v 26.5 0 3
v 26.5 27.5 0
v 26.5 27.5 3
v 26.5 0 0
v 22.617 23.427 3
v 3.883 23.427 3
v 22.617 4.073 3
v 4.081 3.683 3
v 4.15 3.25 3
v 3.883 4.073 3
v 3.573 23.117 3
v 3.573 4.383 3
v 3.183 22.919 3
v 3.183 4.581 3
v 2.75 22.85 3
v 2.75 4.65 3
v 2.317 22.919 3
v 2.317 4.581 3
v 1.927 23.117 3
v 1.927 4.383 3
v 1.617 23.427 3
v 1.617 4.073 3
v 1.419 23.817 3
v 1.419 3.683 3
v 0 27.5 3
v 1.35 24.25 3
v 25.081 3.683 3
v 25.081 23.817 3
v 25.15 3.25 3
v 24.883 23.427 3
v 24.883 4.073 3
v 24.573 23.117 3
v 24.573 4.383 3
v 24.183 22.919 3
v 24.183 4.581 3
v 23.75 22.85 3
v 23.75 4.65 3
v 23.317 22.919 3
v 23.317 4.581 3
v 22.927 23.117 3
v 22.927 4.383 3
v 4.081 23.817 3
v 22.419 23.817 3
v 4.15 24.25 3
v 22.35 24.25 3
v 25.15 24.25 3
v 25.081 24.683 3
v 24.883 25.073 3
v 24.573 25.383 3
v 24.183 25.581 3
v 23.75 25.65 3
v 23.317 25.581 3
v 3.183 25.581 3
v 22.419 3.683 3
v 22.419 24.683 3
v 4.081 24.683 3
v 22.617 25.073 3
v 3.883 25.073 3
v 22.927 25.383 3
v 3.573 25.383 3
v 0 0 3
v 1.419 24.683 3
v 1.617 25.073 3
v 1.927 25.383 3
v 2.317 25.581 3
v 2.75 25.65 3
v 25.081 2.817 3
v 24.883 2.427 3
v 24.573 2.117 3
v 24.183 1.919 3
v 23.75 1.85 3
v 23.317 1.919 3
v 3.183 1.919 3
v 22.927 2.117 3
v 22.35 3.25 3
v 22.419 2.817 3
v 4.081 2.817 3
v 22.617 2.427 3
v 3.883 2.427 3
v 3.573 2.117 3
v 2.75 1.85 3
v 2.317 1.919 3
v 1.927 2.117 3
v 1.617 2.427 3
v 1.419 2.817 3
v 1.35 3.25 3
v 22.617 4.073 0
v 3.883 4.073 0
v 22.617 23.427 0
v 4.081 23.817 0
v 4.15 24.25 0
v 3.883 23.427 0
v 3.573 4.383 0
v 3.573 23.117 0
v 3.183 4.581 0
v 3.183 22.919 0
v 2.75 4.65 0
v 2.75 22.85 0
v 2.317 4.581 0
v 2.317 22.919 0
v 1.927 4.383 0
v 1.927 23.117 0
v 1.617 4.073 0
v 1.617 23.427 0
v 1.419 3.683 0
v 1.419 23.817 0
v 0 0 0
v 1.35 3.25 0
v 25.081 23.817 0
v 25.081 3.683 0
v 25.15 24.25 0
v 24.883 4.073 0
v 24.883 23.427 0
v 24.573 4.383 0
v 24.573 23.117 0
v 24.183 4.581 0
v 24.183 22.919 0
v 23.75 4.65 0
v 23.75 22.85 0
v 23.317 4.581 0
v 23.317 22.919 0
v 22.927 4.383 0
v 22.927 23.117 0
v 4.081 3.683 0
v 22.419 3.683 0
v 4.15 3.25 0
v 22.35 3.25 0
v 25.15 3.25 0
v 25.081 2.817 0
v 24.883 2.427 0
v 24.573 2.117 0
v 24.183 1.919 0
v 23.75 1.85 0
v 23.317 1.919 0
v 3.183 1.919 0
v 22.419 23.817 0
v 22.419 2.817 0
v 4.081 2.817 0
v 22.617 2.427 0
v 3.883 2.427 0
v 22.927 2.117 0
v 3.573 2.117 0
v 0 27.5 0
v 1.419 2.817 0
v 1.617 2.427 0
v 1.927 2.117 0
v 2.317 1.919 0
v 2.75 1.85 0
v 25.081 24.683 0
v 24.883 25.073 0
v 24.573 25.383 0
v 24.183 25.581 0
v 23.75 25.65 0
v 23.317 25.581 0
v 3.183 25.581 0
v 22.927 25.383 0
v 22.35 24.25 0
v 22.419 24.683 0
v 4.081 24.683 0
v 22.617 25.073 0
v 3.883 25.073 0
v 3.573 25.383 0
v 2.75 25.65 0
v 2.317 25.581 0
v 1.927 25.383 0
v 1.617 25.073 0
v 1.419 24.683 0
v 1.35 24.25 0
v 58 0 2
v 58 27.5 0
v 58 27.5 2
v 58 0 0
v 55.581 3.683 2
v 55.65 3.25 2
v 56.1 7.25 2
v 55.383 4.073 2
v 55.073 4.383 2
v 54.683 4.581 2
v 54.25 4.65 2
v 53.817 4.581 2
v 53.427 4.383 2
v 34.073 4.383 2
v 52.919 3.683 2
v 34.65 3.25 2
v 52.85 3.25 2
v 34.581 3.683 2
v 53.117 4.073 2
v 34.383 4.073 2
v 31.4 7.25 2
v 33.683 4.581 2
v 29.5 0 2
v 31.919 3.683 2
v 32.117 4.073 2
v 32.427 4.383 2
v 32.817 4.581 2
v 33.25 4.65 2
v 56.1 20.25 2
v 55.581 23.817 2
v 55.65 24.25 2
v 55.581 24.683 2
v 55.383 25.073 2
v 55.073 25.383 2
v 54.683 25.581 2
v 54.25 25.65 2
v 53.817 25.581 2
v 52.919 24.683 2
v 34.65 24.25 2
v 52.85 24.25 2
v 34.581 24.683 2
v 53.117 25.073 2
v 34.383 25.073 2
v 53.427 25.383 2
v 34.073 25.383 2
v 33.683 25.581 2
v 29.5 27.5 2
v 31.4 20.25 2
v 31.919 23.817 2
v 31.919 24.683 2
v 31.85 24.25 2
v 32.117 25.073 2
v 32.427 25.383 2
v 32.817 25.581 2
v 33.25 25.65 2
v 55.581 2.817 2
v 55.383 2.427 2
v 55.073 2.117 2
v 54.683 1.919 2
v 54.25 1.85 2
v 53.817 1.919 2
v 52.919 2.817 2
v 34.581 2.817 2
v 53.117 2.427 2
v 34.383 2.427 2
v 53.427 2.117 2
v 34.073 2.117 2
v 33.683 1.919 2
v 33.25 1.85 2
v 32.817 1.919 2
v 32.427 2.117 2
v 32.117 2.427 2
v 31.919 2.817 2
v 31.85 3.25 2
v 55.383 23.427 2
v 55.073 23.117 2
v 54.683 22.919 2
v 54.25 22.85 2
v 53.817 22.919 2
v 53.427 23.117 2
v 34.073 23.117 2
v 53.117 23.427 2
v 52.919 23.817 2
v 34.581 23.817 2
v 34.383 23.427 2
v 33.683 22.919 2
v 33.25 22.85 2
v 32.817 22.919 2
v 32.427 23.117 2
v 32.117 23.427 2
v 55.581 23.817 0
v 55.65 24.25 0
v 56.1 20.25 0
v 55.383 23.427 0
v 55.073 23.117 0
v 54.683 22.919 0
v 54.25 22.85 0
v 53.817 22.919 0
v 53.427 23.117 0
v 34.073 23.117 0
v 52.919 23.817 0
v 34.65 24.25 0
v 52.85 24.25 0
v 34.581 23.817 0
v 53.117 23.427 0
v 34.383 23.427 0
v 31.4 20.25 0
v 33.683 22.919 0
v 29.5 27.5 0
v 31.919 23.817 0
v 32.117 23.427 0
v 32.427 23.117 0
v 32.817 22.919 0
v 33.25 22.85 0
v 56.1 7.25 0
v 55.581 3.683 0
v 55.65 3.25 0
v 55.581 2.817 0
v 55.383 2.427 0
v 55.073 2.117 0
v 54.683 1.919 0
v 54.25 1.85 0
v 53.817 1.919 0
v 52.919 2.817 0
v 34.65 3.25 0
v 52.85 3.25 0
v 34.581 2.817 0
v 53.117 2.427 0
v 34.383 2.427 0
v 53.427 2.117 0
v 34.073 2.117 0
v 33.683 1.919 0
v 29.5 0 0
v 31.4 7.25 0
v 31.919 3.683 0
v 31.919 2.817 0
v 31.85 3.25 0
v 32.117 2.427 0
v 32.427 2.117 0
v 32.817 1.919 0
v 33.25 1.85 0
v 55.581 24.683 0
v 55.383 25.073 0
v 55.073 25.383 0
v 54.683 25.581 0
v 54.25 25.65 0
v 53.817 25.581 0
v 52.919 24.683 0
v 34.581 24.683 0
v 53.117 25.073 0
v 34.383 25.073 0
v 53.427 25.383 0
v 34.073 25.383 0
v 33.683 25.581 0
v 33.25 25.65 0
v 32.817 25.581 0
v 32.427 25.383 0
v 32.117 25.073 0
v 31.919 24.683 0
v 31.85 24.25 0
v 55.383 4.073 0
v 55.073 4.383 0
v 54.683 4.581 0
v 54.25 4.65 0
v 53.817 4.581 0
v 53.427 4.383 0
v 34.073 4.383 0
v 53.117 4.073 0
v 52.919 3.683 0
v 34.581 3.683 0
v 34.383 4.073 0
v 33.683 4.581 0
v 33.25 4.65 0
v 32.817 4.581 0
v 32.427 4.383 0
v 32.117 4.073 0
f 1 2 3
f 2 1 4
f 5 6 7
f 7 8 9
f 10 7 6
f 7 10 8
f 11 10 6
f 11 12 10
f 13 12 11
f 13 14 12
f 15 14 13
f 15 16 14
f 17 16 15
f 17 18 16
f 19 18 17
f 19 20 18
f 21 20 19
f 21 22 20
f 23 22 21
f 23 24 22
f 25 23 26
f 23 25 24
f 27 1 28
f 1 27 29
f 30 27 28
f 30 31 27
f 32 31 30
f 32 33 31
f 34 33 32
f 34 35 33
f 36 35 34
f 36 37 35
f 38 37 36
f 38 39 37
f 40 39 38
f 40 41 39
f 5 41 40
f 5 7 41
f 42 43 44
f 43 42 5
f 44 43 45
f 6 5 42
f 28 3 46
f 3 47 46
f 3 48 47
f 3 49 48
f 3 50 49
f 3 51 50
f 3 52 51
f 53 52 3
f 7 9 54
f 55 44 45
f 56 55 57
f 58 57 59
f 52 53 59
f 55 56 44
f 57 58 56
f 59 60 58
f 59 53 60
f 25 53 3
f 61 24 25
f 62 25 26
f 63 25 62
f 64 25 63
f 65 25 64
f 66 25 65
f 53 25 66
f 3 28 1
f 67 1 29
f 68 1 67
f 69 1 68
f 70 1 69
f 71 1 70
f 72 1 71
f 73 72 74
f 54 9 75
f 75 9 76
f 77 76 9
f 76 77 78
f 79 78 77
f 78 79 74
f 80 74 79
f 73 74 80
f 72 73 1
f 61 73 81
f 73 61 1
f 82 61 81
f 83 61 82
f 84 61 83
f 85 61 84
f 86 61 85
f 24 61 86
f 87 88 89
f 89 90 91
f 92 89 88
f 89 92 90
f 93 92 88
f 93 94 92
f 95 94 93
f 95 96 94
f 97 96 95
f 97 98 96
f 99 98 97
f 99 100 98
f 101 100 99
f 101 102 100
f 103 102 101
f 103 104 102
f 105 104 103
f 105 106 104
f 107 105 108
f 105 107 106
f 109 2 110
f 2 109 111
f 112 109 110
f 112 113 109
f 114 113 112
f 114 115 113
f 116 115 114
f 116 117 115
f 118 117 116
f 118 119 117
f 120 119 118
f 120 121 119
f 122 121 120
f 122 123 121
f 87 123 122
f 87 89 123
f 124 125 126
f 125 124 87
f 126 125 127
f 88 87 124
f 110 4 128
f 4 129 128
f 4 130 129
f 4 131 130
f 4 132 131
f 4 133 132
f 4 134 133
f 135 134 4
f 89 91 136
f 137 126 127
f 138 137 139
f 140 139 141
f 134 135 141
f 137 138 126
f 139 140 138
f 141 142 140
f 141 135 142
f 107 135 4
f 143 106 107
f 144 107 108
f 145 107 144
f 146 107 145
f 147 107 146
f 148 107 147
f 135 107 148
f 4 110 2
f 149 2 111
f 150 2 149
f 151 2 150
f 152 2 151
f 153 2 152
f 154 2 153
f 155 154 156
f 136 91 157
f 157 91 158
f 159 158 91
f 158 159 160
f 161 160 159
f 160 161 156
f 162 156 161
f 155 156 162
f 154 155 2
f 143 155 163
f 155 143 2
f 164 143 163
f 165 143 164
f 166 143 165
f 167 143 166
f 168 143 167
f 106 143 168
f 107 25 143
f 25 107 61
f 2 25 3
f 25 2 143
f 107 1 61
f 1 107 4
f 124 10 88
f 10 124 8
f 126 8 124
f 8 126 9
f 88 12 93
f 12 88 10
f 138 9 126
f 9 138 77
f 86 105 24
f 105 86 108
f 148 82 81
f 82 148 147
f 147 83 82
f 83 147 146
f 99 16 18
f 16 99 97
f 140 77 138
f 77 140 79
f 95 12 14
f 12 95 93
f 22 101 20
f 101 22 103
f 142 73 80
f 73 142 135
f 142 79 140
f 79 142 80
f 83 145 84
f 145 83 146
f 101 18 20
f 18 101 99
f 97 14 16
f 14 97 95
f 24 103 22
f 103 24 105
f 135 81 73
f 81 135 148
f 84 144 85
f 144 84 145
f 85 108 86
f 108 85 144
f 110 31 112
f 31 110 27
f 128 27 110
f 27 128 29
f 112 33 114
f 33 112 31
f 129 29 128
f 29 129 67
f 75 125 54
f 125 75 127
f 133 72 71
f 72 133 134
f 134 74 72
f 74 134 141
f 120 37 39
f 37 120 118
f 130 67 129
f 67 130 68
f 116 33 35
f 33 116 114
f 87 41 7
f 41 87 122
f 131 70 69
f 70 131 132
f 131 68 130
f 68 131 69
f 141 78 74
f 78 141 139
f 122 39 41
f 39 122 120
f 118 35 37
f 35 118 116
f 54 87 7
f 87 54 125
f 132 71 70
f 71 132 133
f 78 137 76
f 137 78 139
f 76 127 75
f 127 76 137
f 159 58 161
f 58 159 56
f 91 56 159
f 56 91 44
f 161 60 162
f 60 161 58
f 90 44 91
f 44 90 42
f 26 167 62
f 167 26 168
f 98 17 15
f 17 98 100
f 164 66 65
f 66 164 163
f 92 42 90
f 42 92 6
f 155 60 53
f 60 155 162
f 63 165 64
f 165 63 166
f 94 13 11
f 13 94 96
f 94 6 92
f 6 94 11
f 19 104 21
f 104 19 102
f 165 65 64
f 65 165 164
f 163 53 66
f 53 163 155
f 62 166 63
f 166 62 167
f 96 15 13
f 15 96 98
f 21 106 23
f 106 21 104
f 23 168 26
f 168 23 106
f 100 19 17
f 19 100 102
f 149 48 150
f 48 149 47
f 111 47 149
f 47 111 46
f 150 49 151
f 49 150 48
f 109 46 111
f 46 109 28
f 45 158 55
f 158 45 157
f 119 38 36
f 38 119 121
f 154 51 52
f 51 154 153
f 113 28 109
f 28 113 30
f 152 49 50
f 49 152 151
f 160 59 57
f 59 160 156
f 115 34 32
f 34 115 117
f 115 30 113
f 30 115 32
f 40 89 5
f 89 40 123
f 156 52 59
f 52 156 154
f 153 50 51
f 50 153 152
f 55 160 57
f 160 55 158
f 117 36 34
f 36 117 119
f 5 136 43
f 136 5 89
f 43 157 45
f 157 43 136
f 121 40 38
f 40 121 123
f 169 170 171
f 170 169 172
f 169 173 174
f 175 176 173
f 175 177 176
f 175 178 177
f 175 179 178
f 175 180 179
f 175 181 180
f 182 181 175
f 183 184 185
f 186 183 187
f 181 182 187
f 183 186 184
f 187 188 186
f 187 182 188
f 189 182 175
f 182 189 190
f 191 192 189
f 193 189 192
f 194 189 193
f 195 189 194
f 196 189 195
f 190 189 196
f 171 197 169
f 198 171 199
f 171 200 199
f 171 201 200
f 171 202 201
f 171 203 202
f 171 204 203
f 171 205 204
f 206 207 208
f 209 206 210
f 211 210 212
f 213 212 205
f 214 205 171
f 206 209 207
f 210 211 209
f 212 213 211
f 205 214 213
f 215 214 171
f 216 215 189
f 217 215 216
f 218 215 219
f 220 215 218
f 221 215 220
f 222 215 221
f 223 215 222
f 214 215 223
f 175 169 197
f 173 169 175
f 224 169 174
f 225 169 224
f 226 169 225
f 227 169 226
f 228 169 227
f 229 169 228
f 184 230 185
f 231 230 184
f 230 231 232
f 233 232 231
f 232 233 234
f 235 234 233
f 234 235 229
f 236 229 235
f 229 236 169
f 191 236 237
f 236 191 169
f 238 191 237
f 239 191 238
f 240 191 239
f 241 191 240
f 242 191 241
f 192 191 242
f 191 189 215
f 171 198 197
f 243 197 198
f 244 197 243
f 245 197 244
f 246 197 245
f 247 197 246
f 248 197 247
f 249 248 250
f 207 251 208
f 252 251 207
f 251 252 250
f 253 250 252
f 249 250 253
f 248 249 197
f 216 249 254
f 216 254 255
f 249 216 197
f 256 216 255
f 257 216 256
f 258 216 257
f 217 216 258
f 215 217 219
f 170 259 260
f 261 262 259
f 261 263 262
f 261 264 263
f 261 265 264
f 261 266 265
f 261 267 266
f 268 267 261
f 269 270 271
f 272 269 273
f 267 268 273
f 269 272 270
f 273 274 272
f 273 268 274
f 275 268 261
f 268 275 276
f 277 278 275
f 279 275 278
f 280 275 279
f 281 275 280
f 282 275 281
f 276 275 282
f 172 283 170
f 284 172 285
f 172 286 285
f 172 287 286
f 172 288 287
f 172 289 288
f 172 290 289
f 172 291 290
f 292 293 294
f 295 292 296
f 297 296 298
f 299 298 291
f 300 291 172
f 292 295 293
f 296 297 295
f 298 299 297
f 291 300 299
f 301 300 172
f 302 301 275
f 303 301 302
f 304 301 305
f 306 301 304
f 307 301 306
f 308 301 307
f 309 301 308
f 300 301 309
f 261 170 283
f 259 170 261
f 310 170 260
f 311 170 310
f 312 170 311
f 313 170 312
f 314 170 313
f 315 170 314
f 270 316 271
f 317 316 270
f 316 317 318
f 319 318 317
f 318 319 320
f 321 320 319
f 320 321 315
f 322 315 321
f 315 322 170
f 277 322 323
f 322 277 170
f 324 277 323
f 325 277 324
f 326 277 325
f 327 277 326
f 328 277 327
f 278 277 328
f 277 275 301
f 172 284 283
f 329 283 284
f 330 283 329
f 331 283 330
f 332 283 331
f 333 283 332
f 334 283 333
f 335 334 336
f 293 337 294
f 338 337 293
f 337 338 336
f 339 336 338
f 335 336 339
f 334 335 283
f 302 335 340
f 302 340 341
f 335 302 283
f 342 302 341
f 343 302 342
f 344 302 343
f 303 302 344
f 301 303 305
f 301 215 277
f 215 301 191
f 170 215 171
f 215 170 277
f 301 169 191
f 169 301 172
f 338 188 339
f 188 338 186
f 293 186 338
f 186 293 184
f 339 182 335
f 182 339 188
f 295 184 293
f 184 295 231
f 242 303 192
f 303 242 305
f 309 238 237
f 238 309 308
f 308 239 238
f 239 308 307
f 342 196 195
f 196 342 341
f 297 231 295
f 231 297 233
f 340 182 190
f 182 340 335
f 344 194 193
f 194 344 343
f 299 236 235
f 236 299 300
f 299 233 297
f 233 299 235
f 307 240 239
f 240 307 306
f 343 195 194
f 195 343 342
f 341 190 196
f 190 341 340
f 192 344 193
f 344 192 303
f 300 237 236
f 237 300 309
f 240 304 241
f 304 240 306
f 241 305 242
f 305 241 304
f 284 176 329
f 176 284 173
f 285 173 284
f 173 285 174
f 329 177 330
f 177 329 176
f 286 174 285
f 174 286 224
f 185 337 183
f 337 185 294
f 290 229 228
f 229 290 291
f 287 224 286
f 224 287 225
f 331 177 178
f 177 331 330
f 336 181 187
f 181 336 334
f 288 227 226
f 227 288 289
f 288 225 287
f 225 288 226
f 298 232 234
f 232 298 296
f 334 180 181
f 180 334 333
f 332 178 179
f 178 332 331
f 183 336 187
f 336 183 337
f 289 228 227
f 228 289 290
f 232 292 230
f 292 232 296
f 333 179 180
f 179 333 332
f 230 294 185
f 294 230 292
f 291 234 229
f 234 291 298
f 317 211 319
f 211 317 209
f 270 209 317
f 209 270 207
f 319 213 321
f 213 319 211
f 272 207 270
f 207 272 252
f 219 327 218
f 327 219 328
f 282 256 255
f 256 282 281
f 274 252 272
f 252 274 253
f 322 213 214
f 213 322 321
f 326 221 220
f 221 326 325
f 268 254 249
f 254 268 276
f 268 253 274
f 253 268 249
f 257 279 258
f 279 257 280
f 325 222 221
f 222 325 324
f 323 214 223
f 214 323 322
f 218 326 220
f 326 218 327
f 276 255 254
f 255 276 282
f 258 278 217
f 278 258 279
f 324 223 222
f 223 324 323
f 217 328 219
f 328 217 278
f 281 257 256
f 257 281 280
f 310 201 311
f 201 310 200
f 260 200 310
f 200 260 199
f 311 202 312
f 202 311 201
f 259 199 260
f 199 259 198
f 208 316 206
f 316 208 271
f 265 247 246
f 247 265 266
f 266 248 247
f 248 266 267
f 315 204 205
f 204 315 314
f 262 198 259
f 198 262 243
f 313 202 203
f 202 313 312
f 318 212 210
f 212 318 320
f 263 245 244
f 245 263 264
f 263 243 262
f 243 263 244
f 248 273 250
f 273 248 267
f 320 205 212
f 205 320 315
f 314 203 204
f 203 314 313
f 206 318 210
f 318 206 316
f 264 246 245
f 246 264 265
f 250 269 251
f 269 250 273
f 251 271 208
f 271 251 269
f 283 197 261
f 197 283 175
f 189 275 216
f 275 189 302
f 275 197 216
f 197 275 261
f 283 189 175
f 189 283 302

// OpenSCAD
/* OLED dimensions. 
 * see https://www.aliexpress.com/item/1005006969695993.html?spm=a2g0o.productlist.main.19.78144067Mgld7O&algo_pvid=971f9259-3a85-4a97-a5de-a915efe05848&algo_exp_id=971f9259-3a85-4a97-a5de-a915efe05848-9&pdp_npi=4%40dis%21AUD%2128.02%2117.37%21%21%21133.50%2182.77%21%4021413d5a17177373837866259eb257%2112000038892733587%21sea%21AU%21195567365%21&curPageLogUid=skBgWphW3XTy&utparam-url=scene%3Asearch%7Cquery_from%3A 
 */
 pcb_width = 26.5;
 pcb_height = 27.5;
 hole_diameter = 2.8;
 hole_radius = hole_diameter / 2;
 hole_spacing_width = 21;
 hole_spacing_height = 21;
 panel_width = 24.7;
 panel_height = 13;
 cover_thickness = 2;
 frame_thickness = 3;
 
 /* base plate generates a plate with a width equal to that of the PCB. 
    for the cover there is an extension to the plate on either side to accomodate the edge of the screen
    */
 module base_plate(thickness, extension_width) {
     cube( 
            size=[ pcb_width + extension_width, pcb_height, thickness ] );
 }
 
 /*
    a simple throughhole in the frame
  */
 module through_hole() {
     cylinder( frame_thickness + 1, hole_radius, hole_radius, $fn=20);
 }
 
 /* 
  This is a base plate with four holes and an optional extension to the width of the frame, but maintaining the position of the holes. That is, the extension to the width is added on past the holes, not into the middle 
  */
 module holed_frame(layer_thickness, frame_extension)
 {
     hole_offset_x = (pcb_width - hole_spacing_width) / 2;
     hole_offset_y = (pcb_height - hole_spacing_height) / 2;
     frame_extension_offset = frame_extension / 2;
     
     bottom_left_hole_offset = [
        hole_offset_x + frame_extension_offset,
        hole_offset_y,
        0];
     
     bottom_right_hole_offset = [
        (hole_offset_x + hole_spacing_width + frame_extension_offset),
        hole_offset_y,
        0];
     
     top_left_hole_offset = [
        hole_offset_x + frame_extension_offset,
        hole_offset_y + hole_spacing_height,
        0];
     
     top_right_hole_offset = [
        (hole_offset_x + hole_spacing_width+ frame_extension_offset),
        hole_offset_y + hole_spacing_height,
        0];
        
     // subtract holes from base plate
     difference () {
        base_plate(layer_thickness, frame_extension);
        translate (bottom_left_hole_offset) 
            through_hole();
        translate (bottom_right_hole_offset) 
            through_hole();
        translate (top_left_hole_offset)
            through_hole();
        
        translate (top_right_hole_offset)
            through_hole();
     }
 }
 
 /* 
  the bottom frame (or base) is just plastic with four holes
  */
 module oled_bottom_frame()
 {
     holed_frame(frame_thickness, 0);
 }
 
 /* 
  this is cut out of the screen panel. To be differenced from the panels
  */
 module panel_cutout() {
     cube ( size= [ panel_width, panel_height, frame_thickness ]);
 }
 
 /* the cover should just let the panel be shown, but cover up the other bits
  */
 module oled_cover_frame() {
     // extend it by the thickness width.
     panel_extension = cover_thickness;
     panel_offset_x = (pcb_width - panel_width) /2 + panel_extension / 2;
     panel_offset_y = (pcb_height - panel_height) / 2;
     
     difference () {
        holed_frame(cover_thickness, panel_extension);
        // cut out lcd panel
        translate( [panel_offset_x, panel_offset_y, 0]) 
         panel_cutout();
     }
 }
 
 
 module oled_frames_assembly() {    
    oled_bottom_frame();
    translate ([pcb_width + frame_thickness,0,0]) oled_cover_frame();
     
 }
 
 oled_frames_assembly();
 // ole d_cover_frame();
